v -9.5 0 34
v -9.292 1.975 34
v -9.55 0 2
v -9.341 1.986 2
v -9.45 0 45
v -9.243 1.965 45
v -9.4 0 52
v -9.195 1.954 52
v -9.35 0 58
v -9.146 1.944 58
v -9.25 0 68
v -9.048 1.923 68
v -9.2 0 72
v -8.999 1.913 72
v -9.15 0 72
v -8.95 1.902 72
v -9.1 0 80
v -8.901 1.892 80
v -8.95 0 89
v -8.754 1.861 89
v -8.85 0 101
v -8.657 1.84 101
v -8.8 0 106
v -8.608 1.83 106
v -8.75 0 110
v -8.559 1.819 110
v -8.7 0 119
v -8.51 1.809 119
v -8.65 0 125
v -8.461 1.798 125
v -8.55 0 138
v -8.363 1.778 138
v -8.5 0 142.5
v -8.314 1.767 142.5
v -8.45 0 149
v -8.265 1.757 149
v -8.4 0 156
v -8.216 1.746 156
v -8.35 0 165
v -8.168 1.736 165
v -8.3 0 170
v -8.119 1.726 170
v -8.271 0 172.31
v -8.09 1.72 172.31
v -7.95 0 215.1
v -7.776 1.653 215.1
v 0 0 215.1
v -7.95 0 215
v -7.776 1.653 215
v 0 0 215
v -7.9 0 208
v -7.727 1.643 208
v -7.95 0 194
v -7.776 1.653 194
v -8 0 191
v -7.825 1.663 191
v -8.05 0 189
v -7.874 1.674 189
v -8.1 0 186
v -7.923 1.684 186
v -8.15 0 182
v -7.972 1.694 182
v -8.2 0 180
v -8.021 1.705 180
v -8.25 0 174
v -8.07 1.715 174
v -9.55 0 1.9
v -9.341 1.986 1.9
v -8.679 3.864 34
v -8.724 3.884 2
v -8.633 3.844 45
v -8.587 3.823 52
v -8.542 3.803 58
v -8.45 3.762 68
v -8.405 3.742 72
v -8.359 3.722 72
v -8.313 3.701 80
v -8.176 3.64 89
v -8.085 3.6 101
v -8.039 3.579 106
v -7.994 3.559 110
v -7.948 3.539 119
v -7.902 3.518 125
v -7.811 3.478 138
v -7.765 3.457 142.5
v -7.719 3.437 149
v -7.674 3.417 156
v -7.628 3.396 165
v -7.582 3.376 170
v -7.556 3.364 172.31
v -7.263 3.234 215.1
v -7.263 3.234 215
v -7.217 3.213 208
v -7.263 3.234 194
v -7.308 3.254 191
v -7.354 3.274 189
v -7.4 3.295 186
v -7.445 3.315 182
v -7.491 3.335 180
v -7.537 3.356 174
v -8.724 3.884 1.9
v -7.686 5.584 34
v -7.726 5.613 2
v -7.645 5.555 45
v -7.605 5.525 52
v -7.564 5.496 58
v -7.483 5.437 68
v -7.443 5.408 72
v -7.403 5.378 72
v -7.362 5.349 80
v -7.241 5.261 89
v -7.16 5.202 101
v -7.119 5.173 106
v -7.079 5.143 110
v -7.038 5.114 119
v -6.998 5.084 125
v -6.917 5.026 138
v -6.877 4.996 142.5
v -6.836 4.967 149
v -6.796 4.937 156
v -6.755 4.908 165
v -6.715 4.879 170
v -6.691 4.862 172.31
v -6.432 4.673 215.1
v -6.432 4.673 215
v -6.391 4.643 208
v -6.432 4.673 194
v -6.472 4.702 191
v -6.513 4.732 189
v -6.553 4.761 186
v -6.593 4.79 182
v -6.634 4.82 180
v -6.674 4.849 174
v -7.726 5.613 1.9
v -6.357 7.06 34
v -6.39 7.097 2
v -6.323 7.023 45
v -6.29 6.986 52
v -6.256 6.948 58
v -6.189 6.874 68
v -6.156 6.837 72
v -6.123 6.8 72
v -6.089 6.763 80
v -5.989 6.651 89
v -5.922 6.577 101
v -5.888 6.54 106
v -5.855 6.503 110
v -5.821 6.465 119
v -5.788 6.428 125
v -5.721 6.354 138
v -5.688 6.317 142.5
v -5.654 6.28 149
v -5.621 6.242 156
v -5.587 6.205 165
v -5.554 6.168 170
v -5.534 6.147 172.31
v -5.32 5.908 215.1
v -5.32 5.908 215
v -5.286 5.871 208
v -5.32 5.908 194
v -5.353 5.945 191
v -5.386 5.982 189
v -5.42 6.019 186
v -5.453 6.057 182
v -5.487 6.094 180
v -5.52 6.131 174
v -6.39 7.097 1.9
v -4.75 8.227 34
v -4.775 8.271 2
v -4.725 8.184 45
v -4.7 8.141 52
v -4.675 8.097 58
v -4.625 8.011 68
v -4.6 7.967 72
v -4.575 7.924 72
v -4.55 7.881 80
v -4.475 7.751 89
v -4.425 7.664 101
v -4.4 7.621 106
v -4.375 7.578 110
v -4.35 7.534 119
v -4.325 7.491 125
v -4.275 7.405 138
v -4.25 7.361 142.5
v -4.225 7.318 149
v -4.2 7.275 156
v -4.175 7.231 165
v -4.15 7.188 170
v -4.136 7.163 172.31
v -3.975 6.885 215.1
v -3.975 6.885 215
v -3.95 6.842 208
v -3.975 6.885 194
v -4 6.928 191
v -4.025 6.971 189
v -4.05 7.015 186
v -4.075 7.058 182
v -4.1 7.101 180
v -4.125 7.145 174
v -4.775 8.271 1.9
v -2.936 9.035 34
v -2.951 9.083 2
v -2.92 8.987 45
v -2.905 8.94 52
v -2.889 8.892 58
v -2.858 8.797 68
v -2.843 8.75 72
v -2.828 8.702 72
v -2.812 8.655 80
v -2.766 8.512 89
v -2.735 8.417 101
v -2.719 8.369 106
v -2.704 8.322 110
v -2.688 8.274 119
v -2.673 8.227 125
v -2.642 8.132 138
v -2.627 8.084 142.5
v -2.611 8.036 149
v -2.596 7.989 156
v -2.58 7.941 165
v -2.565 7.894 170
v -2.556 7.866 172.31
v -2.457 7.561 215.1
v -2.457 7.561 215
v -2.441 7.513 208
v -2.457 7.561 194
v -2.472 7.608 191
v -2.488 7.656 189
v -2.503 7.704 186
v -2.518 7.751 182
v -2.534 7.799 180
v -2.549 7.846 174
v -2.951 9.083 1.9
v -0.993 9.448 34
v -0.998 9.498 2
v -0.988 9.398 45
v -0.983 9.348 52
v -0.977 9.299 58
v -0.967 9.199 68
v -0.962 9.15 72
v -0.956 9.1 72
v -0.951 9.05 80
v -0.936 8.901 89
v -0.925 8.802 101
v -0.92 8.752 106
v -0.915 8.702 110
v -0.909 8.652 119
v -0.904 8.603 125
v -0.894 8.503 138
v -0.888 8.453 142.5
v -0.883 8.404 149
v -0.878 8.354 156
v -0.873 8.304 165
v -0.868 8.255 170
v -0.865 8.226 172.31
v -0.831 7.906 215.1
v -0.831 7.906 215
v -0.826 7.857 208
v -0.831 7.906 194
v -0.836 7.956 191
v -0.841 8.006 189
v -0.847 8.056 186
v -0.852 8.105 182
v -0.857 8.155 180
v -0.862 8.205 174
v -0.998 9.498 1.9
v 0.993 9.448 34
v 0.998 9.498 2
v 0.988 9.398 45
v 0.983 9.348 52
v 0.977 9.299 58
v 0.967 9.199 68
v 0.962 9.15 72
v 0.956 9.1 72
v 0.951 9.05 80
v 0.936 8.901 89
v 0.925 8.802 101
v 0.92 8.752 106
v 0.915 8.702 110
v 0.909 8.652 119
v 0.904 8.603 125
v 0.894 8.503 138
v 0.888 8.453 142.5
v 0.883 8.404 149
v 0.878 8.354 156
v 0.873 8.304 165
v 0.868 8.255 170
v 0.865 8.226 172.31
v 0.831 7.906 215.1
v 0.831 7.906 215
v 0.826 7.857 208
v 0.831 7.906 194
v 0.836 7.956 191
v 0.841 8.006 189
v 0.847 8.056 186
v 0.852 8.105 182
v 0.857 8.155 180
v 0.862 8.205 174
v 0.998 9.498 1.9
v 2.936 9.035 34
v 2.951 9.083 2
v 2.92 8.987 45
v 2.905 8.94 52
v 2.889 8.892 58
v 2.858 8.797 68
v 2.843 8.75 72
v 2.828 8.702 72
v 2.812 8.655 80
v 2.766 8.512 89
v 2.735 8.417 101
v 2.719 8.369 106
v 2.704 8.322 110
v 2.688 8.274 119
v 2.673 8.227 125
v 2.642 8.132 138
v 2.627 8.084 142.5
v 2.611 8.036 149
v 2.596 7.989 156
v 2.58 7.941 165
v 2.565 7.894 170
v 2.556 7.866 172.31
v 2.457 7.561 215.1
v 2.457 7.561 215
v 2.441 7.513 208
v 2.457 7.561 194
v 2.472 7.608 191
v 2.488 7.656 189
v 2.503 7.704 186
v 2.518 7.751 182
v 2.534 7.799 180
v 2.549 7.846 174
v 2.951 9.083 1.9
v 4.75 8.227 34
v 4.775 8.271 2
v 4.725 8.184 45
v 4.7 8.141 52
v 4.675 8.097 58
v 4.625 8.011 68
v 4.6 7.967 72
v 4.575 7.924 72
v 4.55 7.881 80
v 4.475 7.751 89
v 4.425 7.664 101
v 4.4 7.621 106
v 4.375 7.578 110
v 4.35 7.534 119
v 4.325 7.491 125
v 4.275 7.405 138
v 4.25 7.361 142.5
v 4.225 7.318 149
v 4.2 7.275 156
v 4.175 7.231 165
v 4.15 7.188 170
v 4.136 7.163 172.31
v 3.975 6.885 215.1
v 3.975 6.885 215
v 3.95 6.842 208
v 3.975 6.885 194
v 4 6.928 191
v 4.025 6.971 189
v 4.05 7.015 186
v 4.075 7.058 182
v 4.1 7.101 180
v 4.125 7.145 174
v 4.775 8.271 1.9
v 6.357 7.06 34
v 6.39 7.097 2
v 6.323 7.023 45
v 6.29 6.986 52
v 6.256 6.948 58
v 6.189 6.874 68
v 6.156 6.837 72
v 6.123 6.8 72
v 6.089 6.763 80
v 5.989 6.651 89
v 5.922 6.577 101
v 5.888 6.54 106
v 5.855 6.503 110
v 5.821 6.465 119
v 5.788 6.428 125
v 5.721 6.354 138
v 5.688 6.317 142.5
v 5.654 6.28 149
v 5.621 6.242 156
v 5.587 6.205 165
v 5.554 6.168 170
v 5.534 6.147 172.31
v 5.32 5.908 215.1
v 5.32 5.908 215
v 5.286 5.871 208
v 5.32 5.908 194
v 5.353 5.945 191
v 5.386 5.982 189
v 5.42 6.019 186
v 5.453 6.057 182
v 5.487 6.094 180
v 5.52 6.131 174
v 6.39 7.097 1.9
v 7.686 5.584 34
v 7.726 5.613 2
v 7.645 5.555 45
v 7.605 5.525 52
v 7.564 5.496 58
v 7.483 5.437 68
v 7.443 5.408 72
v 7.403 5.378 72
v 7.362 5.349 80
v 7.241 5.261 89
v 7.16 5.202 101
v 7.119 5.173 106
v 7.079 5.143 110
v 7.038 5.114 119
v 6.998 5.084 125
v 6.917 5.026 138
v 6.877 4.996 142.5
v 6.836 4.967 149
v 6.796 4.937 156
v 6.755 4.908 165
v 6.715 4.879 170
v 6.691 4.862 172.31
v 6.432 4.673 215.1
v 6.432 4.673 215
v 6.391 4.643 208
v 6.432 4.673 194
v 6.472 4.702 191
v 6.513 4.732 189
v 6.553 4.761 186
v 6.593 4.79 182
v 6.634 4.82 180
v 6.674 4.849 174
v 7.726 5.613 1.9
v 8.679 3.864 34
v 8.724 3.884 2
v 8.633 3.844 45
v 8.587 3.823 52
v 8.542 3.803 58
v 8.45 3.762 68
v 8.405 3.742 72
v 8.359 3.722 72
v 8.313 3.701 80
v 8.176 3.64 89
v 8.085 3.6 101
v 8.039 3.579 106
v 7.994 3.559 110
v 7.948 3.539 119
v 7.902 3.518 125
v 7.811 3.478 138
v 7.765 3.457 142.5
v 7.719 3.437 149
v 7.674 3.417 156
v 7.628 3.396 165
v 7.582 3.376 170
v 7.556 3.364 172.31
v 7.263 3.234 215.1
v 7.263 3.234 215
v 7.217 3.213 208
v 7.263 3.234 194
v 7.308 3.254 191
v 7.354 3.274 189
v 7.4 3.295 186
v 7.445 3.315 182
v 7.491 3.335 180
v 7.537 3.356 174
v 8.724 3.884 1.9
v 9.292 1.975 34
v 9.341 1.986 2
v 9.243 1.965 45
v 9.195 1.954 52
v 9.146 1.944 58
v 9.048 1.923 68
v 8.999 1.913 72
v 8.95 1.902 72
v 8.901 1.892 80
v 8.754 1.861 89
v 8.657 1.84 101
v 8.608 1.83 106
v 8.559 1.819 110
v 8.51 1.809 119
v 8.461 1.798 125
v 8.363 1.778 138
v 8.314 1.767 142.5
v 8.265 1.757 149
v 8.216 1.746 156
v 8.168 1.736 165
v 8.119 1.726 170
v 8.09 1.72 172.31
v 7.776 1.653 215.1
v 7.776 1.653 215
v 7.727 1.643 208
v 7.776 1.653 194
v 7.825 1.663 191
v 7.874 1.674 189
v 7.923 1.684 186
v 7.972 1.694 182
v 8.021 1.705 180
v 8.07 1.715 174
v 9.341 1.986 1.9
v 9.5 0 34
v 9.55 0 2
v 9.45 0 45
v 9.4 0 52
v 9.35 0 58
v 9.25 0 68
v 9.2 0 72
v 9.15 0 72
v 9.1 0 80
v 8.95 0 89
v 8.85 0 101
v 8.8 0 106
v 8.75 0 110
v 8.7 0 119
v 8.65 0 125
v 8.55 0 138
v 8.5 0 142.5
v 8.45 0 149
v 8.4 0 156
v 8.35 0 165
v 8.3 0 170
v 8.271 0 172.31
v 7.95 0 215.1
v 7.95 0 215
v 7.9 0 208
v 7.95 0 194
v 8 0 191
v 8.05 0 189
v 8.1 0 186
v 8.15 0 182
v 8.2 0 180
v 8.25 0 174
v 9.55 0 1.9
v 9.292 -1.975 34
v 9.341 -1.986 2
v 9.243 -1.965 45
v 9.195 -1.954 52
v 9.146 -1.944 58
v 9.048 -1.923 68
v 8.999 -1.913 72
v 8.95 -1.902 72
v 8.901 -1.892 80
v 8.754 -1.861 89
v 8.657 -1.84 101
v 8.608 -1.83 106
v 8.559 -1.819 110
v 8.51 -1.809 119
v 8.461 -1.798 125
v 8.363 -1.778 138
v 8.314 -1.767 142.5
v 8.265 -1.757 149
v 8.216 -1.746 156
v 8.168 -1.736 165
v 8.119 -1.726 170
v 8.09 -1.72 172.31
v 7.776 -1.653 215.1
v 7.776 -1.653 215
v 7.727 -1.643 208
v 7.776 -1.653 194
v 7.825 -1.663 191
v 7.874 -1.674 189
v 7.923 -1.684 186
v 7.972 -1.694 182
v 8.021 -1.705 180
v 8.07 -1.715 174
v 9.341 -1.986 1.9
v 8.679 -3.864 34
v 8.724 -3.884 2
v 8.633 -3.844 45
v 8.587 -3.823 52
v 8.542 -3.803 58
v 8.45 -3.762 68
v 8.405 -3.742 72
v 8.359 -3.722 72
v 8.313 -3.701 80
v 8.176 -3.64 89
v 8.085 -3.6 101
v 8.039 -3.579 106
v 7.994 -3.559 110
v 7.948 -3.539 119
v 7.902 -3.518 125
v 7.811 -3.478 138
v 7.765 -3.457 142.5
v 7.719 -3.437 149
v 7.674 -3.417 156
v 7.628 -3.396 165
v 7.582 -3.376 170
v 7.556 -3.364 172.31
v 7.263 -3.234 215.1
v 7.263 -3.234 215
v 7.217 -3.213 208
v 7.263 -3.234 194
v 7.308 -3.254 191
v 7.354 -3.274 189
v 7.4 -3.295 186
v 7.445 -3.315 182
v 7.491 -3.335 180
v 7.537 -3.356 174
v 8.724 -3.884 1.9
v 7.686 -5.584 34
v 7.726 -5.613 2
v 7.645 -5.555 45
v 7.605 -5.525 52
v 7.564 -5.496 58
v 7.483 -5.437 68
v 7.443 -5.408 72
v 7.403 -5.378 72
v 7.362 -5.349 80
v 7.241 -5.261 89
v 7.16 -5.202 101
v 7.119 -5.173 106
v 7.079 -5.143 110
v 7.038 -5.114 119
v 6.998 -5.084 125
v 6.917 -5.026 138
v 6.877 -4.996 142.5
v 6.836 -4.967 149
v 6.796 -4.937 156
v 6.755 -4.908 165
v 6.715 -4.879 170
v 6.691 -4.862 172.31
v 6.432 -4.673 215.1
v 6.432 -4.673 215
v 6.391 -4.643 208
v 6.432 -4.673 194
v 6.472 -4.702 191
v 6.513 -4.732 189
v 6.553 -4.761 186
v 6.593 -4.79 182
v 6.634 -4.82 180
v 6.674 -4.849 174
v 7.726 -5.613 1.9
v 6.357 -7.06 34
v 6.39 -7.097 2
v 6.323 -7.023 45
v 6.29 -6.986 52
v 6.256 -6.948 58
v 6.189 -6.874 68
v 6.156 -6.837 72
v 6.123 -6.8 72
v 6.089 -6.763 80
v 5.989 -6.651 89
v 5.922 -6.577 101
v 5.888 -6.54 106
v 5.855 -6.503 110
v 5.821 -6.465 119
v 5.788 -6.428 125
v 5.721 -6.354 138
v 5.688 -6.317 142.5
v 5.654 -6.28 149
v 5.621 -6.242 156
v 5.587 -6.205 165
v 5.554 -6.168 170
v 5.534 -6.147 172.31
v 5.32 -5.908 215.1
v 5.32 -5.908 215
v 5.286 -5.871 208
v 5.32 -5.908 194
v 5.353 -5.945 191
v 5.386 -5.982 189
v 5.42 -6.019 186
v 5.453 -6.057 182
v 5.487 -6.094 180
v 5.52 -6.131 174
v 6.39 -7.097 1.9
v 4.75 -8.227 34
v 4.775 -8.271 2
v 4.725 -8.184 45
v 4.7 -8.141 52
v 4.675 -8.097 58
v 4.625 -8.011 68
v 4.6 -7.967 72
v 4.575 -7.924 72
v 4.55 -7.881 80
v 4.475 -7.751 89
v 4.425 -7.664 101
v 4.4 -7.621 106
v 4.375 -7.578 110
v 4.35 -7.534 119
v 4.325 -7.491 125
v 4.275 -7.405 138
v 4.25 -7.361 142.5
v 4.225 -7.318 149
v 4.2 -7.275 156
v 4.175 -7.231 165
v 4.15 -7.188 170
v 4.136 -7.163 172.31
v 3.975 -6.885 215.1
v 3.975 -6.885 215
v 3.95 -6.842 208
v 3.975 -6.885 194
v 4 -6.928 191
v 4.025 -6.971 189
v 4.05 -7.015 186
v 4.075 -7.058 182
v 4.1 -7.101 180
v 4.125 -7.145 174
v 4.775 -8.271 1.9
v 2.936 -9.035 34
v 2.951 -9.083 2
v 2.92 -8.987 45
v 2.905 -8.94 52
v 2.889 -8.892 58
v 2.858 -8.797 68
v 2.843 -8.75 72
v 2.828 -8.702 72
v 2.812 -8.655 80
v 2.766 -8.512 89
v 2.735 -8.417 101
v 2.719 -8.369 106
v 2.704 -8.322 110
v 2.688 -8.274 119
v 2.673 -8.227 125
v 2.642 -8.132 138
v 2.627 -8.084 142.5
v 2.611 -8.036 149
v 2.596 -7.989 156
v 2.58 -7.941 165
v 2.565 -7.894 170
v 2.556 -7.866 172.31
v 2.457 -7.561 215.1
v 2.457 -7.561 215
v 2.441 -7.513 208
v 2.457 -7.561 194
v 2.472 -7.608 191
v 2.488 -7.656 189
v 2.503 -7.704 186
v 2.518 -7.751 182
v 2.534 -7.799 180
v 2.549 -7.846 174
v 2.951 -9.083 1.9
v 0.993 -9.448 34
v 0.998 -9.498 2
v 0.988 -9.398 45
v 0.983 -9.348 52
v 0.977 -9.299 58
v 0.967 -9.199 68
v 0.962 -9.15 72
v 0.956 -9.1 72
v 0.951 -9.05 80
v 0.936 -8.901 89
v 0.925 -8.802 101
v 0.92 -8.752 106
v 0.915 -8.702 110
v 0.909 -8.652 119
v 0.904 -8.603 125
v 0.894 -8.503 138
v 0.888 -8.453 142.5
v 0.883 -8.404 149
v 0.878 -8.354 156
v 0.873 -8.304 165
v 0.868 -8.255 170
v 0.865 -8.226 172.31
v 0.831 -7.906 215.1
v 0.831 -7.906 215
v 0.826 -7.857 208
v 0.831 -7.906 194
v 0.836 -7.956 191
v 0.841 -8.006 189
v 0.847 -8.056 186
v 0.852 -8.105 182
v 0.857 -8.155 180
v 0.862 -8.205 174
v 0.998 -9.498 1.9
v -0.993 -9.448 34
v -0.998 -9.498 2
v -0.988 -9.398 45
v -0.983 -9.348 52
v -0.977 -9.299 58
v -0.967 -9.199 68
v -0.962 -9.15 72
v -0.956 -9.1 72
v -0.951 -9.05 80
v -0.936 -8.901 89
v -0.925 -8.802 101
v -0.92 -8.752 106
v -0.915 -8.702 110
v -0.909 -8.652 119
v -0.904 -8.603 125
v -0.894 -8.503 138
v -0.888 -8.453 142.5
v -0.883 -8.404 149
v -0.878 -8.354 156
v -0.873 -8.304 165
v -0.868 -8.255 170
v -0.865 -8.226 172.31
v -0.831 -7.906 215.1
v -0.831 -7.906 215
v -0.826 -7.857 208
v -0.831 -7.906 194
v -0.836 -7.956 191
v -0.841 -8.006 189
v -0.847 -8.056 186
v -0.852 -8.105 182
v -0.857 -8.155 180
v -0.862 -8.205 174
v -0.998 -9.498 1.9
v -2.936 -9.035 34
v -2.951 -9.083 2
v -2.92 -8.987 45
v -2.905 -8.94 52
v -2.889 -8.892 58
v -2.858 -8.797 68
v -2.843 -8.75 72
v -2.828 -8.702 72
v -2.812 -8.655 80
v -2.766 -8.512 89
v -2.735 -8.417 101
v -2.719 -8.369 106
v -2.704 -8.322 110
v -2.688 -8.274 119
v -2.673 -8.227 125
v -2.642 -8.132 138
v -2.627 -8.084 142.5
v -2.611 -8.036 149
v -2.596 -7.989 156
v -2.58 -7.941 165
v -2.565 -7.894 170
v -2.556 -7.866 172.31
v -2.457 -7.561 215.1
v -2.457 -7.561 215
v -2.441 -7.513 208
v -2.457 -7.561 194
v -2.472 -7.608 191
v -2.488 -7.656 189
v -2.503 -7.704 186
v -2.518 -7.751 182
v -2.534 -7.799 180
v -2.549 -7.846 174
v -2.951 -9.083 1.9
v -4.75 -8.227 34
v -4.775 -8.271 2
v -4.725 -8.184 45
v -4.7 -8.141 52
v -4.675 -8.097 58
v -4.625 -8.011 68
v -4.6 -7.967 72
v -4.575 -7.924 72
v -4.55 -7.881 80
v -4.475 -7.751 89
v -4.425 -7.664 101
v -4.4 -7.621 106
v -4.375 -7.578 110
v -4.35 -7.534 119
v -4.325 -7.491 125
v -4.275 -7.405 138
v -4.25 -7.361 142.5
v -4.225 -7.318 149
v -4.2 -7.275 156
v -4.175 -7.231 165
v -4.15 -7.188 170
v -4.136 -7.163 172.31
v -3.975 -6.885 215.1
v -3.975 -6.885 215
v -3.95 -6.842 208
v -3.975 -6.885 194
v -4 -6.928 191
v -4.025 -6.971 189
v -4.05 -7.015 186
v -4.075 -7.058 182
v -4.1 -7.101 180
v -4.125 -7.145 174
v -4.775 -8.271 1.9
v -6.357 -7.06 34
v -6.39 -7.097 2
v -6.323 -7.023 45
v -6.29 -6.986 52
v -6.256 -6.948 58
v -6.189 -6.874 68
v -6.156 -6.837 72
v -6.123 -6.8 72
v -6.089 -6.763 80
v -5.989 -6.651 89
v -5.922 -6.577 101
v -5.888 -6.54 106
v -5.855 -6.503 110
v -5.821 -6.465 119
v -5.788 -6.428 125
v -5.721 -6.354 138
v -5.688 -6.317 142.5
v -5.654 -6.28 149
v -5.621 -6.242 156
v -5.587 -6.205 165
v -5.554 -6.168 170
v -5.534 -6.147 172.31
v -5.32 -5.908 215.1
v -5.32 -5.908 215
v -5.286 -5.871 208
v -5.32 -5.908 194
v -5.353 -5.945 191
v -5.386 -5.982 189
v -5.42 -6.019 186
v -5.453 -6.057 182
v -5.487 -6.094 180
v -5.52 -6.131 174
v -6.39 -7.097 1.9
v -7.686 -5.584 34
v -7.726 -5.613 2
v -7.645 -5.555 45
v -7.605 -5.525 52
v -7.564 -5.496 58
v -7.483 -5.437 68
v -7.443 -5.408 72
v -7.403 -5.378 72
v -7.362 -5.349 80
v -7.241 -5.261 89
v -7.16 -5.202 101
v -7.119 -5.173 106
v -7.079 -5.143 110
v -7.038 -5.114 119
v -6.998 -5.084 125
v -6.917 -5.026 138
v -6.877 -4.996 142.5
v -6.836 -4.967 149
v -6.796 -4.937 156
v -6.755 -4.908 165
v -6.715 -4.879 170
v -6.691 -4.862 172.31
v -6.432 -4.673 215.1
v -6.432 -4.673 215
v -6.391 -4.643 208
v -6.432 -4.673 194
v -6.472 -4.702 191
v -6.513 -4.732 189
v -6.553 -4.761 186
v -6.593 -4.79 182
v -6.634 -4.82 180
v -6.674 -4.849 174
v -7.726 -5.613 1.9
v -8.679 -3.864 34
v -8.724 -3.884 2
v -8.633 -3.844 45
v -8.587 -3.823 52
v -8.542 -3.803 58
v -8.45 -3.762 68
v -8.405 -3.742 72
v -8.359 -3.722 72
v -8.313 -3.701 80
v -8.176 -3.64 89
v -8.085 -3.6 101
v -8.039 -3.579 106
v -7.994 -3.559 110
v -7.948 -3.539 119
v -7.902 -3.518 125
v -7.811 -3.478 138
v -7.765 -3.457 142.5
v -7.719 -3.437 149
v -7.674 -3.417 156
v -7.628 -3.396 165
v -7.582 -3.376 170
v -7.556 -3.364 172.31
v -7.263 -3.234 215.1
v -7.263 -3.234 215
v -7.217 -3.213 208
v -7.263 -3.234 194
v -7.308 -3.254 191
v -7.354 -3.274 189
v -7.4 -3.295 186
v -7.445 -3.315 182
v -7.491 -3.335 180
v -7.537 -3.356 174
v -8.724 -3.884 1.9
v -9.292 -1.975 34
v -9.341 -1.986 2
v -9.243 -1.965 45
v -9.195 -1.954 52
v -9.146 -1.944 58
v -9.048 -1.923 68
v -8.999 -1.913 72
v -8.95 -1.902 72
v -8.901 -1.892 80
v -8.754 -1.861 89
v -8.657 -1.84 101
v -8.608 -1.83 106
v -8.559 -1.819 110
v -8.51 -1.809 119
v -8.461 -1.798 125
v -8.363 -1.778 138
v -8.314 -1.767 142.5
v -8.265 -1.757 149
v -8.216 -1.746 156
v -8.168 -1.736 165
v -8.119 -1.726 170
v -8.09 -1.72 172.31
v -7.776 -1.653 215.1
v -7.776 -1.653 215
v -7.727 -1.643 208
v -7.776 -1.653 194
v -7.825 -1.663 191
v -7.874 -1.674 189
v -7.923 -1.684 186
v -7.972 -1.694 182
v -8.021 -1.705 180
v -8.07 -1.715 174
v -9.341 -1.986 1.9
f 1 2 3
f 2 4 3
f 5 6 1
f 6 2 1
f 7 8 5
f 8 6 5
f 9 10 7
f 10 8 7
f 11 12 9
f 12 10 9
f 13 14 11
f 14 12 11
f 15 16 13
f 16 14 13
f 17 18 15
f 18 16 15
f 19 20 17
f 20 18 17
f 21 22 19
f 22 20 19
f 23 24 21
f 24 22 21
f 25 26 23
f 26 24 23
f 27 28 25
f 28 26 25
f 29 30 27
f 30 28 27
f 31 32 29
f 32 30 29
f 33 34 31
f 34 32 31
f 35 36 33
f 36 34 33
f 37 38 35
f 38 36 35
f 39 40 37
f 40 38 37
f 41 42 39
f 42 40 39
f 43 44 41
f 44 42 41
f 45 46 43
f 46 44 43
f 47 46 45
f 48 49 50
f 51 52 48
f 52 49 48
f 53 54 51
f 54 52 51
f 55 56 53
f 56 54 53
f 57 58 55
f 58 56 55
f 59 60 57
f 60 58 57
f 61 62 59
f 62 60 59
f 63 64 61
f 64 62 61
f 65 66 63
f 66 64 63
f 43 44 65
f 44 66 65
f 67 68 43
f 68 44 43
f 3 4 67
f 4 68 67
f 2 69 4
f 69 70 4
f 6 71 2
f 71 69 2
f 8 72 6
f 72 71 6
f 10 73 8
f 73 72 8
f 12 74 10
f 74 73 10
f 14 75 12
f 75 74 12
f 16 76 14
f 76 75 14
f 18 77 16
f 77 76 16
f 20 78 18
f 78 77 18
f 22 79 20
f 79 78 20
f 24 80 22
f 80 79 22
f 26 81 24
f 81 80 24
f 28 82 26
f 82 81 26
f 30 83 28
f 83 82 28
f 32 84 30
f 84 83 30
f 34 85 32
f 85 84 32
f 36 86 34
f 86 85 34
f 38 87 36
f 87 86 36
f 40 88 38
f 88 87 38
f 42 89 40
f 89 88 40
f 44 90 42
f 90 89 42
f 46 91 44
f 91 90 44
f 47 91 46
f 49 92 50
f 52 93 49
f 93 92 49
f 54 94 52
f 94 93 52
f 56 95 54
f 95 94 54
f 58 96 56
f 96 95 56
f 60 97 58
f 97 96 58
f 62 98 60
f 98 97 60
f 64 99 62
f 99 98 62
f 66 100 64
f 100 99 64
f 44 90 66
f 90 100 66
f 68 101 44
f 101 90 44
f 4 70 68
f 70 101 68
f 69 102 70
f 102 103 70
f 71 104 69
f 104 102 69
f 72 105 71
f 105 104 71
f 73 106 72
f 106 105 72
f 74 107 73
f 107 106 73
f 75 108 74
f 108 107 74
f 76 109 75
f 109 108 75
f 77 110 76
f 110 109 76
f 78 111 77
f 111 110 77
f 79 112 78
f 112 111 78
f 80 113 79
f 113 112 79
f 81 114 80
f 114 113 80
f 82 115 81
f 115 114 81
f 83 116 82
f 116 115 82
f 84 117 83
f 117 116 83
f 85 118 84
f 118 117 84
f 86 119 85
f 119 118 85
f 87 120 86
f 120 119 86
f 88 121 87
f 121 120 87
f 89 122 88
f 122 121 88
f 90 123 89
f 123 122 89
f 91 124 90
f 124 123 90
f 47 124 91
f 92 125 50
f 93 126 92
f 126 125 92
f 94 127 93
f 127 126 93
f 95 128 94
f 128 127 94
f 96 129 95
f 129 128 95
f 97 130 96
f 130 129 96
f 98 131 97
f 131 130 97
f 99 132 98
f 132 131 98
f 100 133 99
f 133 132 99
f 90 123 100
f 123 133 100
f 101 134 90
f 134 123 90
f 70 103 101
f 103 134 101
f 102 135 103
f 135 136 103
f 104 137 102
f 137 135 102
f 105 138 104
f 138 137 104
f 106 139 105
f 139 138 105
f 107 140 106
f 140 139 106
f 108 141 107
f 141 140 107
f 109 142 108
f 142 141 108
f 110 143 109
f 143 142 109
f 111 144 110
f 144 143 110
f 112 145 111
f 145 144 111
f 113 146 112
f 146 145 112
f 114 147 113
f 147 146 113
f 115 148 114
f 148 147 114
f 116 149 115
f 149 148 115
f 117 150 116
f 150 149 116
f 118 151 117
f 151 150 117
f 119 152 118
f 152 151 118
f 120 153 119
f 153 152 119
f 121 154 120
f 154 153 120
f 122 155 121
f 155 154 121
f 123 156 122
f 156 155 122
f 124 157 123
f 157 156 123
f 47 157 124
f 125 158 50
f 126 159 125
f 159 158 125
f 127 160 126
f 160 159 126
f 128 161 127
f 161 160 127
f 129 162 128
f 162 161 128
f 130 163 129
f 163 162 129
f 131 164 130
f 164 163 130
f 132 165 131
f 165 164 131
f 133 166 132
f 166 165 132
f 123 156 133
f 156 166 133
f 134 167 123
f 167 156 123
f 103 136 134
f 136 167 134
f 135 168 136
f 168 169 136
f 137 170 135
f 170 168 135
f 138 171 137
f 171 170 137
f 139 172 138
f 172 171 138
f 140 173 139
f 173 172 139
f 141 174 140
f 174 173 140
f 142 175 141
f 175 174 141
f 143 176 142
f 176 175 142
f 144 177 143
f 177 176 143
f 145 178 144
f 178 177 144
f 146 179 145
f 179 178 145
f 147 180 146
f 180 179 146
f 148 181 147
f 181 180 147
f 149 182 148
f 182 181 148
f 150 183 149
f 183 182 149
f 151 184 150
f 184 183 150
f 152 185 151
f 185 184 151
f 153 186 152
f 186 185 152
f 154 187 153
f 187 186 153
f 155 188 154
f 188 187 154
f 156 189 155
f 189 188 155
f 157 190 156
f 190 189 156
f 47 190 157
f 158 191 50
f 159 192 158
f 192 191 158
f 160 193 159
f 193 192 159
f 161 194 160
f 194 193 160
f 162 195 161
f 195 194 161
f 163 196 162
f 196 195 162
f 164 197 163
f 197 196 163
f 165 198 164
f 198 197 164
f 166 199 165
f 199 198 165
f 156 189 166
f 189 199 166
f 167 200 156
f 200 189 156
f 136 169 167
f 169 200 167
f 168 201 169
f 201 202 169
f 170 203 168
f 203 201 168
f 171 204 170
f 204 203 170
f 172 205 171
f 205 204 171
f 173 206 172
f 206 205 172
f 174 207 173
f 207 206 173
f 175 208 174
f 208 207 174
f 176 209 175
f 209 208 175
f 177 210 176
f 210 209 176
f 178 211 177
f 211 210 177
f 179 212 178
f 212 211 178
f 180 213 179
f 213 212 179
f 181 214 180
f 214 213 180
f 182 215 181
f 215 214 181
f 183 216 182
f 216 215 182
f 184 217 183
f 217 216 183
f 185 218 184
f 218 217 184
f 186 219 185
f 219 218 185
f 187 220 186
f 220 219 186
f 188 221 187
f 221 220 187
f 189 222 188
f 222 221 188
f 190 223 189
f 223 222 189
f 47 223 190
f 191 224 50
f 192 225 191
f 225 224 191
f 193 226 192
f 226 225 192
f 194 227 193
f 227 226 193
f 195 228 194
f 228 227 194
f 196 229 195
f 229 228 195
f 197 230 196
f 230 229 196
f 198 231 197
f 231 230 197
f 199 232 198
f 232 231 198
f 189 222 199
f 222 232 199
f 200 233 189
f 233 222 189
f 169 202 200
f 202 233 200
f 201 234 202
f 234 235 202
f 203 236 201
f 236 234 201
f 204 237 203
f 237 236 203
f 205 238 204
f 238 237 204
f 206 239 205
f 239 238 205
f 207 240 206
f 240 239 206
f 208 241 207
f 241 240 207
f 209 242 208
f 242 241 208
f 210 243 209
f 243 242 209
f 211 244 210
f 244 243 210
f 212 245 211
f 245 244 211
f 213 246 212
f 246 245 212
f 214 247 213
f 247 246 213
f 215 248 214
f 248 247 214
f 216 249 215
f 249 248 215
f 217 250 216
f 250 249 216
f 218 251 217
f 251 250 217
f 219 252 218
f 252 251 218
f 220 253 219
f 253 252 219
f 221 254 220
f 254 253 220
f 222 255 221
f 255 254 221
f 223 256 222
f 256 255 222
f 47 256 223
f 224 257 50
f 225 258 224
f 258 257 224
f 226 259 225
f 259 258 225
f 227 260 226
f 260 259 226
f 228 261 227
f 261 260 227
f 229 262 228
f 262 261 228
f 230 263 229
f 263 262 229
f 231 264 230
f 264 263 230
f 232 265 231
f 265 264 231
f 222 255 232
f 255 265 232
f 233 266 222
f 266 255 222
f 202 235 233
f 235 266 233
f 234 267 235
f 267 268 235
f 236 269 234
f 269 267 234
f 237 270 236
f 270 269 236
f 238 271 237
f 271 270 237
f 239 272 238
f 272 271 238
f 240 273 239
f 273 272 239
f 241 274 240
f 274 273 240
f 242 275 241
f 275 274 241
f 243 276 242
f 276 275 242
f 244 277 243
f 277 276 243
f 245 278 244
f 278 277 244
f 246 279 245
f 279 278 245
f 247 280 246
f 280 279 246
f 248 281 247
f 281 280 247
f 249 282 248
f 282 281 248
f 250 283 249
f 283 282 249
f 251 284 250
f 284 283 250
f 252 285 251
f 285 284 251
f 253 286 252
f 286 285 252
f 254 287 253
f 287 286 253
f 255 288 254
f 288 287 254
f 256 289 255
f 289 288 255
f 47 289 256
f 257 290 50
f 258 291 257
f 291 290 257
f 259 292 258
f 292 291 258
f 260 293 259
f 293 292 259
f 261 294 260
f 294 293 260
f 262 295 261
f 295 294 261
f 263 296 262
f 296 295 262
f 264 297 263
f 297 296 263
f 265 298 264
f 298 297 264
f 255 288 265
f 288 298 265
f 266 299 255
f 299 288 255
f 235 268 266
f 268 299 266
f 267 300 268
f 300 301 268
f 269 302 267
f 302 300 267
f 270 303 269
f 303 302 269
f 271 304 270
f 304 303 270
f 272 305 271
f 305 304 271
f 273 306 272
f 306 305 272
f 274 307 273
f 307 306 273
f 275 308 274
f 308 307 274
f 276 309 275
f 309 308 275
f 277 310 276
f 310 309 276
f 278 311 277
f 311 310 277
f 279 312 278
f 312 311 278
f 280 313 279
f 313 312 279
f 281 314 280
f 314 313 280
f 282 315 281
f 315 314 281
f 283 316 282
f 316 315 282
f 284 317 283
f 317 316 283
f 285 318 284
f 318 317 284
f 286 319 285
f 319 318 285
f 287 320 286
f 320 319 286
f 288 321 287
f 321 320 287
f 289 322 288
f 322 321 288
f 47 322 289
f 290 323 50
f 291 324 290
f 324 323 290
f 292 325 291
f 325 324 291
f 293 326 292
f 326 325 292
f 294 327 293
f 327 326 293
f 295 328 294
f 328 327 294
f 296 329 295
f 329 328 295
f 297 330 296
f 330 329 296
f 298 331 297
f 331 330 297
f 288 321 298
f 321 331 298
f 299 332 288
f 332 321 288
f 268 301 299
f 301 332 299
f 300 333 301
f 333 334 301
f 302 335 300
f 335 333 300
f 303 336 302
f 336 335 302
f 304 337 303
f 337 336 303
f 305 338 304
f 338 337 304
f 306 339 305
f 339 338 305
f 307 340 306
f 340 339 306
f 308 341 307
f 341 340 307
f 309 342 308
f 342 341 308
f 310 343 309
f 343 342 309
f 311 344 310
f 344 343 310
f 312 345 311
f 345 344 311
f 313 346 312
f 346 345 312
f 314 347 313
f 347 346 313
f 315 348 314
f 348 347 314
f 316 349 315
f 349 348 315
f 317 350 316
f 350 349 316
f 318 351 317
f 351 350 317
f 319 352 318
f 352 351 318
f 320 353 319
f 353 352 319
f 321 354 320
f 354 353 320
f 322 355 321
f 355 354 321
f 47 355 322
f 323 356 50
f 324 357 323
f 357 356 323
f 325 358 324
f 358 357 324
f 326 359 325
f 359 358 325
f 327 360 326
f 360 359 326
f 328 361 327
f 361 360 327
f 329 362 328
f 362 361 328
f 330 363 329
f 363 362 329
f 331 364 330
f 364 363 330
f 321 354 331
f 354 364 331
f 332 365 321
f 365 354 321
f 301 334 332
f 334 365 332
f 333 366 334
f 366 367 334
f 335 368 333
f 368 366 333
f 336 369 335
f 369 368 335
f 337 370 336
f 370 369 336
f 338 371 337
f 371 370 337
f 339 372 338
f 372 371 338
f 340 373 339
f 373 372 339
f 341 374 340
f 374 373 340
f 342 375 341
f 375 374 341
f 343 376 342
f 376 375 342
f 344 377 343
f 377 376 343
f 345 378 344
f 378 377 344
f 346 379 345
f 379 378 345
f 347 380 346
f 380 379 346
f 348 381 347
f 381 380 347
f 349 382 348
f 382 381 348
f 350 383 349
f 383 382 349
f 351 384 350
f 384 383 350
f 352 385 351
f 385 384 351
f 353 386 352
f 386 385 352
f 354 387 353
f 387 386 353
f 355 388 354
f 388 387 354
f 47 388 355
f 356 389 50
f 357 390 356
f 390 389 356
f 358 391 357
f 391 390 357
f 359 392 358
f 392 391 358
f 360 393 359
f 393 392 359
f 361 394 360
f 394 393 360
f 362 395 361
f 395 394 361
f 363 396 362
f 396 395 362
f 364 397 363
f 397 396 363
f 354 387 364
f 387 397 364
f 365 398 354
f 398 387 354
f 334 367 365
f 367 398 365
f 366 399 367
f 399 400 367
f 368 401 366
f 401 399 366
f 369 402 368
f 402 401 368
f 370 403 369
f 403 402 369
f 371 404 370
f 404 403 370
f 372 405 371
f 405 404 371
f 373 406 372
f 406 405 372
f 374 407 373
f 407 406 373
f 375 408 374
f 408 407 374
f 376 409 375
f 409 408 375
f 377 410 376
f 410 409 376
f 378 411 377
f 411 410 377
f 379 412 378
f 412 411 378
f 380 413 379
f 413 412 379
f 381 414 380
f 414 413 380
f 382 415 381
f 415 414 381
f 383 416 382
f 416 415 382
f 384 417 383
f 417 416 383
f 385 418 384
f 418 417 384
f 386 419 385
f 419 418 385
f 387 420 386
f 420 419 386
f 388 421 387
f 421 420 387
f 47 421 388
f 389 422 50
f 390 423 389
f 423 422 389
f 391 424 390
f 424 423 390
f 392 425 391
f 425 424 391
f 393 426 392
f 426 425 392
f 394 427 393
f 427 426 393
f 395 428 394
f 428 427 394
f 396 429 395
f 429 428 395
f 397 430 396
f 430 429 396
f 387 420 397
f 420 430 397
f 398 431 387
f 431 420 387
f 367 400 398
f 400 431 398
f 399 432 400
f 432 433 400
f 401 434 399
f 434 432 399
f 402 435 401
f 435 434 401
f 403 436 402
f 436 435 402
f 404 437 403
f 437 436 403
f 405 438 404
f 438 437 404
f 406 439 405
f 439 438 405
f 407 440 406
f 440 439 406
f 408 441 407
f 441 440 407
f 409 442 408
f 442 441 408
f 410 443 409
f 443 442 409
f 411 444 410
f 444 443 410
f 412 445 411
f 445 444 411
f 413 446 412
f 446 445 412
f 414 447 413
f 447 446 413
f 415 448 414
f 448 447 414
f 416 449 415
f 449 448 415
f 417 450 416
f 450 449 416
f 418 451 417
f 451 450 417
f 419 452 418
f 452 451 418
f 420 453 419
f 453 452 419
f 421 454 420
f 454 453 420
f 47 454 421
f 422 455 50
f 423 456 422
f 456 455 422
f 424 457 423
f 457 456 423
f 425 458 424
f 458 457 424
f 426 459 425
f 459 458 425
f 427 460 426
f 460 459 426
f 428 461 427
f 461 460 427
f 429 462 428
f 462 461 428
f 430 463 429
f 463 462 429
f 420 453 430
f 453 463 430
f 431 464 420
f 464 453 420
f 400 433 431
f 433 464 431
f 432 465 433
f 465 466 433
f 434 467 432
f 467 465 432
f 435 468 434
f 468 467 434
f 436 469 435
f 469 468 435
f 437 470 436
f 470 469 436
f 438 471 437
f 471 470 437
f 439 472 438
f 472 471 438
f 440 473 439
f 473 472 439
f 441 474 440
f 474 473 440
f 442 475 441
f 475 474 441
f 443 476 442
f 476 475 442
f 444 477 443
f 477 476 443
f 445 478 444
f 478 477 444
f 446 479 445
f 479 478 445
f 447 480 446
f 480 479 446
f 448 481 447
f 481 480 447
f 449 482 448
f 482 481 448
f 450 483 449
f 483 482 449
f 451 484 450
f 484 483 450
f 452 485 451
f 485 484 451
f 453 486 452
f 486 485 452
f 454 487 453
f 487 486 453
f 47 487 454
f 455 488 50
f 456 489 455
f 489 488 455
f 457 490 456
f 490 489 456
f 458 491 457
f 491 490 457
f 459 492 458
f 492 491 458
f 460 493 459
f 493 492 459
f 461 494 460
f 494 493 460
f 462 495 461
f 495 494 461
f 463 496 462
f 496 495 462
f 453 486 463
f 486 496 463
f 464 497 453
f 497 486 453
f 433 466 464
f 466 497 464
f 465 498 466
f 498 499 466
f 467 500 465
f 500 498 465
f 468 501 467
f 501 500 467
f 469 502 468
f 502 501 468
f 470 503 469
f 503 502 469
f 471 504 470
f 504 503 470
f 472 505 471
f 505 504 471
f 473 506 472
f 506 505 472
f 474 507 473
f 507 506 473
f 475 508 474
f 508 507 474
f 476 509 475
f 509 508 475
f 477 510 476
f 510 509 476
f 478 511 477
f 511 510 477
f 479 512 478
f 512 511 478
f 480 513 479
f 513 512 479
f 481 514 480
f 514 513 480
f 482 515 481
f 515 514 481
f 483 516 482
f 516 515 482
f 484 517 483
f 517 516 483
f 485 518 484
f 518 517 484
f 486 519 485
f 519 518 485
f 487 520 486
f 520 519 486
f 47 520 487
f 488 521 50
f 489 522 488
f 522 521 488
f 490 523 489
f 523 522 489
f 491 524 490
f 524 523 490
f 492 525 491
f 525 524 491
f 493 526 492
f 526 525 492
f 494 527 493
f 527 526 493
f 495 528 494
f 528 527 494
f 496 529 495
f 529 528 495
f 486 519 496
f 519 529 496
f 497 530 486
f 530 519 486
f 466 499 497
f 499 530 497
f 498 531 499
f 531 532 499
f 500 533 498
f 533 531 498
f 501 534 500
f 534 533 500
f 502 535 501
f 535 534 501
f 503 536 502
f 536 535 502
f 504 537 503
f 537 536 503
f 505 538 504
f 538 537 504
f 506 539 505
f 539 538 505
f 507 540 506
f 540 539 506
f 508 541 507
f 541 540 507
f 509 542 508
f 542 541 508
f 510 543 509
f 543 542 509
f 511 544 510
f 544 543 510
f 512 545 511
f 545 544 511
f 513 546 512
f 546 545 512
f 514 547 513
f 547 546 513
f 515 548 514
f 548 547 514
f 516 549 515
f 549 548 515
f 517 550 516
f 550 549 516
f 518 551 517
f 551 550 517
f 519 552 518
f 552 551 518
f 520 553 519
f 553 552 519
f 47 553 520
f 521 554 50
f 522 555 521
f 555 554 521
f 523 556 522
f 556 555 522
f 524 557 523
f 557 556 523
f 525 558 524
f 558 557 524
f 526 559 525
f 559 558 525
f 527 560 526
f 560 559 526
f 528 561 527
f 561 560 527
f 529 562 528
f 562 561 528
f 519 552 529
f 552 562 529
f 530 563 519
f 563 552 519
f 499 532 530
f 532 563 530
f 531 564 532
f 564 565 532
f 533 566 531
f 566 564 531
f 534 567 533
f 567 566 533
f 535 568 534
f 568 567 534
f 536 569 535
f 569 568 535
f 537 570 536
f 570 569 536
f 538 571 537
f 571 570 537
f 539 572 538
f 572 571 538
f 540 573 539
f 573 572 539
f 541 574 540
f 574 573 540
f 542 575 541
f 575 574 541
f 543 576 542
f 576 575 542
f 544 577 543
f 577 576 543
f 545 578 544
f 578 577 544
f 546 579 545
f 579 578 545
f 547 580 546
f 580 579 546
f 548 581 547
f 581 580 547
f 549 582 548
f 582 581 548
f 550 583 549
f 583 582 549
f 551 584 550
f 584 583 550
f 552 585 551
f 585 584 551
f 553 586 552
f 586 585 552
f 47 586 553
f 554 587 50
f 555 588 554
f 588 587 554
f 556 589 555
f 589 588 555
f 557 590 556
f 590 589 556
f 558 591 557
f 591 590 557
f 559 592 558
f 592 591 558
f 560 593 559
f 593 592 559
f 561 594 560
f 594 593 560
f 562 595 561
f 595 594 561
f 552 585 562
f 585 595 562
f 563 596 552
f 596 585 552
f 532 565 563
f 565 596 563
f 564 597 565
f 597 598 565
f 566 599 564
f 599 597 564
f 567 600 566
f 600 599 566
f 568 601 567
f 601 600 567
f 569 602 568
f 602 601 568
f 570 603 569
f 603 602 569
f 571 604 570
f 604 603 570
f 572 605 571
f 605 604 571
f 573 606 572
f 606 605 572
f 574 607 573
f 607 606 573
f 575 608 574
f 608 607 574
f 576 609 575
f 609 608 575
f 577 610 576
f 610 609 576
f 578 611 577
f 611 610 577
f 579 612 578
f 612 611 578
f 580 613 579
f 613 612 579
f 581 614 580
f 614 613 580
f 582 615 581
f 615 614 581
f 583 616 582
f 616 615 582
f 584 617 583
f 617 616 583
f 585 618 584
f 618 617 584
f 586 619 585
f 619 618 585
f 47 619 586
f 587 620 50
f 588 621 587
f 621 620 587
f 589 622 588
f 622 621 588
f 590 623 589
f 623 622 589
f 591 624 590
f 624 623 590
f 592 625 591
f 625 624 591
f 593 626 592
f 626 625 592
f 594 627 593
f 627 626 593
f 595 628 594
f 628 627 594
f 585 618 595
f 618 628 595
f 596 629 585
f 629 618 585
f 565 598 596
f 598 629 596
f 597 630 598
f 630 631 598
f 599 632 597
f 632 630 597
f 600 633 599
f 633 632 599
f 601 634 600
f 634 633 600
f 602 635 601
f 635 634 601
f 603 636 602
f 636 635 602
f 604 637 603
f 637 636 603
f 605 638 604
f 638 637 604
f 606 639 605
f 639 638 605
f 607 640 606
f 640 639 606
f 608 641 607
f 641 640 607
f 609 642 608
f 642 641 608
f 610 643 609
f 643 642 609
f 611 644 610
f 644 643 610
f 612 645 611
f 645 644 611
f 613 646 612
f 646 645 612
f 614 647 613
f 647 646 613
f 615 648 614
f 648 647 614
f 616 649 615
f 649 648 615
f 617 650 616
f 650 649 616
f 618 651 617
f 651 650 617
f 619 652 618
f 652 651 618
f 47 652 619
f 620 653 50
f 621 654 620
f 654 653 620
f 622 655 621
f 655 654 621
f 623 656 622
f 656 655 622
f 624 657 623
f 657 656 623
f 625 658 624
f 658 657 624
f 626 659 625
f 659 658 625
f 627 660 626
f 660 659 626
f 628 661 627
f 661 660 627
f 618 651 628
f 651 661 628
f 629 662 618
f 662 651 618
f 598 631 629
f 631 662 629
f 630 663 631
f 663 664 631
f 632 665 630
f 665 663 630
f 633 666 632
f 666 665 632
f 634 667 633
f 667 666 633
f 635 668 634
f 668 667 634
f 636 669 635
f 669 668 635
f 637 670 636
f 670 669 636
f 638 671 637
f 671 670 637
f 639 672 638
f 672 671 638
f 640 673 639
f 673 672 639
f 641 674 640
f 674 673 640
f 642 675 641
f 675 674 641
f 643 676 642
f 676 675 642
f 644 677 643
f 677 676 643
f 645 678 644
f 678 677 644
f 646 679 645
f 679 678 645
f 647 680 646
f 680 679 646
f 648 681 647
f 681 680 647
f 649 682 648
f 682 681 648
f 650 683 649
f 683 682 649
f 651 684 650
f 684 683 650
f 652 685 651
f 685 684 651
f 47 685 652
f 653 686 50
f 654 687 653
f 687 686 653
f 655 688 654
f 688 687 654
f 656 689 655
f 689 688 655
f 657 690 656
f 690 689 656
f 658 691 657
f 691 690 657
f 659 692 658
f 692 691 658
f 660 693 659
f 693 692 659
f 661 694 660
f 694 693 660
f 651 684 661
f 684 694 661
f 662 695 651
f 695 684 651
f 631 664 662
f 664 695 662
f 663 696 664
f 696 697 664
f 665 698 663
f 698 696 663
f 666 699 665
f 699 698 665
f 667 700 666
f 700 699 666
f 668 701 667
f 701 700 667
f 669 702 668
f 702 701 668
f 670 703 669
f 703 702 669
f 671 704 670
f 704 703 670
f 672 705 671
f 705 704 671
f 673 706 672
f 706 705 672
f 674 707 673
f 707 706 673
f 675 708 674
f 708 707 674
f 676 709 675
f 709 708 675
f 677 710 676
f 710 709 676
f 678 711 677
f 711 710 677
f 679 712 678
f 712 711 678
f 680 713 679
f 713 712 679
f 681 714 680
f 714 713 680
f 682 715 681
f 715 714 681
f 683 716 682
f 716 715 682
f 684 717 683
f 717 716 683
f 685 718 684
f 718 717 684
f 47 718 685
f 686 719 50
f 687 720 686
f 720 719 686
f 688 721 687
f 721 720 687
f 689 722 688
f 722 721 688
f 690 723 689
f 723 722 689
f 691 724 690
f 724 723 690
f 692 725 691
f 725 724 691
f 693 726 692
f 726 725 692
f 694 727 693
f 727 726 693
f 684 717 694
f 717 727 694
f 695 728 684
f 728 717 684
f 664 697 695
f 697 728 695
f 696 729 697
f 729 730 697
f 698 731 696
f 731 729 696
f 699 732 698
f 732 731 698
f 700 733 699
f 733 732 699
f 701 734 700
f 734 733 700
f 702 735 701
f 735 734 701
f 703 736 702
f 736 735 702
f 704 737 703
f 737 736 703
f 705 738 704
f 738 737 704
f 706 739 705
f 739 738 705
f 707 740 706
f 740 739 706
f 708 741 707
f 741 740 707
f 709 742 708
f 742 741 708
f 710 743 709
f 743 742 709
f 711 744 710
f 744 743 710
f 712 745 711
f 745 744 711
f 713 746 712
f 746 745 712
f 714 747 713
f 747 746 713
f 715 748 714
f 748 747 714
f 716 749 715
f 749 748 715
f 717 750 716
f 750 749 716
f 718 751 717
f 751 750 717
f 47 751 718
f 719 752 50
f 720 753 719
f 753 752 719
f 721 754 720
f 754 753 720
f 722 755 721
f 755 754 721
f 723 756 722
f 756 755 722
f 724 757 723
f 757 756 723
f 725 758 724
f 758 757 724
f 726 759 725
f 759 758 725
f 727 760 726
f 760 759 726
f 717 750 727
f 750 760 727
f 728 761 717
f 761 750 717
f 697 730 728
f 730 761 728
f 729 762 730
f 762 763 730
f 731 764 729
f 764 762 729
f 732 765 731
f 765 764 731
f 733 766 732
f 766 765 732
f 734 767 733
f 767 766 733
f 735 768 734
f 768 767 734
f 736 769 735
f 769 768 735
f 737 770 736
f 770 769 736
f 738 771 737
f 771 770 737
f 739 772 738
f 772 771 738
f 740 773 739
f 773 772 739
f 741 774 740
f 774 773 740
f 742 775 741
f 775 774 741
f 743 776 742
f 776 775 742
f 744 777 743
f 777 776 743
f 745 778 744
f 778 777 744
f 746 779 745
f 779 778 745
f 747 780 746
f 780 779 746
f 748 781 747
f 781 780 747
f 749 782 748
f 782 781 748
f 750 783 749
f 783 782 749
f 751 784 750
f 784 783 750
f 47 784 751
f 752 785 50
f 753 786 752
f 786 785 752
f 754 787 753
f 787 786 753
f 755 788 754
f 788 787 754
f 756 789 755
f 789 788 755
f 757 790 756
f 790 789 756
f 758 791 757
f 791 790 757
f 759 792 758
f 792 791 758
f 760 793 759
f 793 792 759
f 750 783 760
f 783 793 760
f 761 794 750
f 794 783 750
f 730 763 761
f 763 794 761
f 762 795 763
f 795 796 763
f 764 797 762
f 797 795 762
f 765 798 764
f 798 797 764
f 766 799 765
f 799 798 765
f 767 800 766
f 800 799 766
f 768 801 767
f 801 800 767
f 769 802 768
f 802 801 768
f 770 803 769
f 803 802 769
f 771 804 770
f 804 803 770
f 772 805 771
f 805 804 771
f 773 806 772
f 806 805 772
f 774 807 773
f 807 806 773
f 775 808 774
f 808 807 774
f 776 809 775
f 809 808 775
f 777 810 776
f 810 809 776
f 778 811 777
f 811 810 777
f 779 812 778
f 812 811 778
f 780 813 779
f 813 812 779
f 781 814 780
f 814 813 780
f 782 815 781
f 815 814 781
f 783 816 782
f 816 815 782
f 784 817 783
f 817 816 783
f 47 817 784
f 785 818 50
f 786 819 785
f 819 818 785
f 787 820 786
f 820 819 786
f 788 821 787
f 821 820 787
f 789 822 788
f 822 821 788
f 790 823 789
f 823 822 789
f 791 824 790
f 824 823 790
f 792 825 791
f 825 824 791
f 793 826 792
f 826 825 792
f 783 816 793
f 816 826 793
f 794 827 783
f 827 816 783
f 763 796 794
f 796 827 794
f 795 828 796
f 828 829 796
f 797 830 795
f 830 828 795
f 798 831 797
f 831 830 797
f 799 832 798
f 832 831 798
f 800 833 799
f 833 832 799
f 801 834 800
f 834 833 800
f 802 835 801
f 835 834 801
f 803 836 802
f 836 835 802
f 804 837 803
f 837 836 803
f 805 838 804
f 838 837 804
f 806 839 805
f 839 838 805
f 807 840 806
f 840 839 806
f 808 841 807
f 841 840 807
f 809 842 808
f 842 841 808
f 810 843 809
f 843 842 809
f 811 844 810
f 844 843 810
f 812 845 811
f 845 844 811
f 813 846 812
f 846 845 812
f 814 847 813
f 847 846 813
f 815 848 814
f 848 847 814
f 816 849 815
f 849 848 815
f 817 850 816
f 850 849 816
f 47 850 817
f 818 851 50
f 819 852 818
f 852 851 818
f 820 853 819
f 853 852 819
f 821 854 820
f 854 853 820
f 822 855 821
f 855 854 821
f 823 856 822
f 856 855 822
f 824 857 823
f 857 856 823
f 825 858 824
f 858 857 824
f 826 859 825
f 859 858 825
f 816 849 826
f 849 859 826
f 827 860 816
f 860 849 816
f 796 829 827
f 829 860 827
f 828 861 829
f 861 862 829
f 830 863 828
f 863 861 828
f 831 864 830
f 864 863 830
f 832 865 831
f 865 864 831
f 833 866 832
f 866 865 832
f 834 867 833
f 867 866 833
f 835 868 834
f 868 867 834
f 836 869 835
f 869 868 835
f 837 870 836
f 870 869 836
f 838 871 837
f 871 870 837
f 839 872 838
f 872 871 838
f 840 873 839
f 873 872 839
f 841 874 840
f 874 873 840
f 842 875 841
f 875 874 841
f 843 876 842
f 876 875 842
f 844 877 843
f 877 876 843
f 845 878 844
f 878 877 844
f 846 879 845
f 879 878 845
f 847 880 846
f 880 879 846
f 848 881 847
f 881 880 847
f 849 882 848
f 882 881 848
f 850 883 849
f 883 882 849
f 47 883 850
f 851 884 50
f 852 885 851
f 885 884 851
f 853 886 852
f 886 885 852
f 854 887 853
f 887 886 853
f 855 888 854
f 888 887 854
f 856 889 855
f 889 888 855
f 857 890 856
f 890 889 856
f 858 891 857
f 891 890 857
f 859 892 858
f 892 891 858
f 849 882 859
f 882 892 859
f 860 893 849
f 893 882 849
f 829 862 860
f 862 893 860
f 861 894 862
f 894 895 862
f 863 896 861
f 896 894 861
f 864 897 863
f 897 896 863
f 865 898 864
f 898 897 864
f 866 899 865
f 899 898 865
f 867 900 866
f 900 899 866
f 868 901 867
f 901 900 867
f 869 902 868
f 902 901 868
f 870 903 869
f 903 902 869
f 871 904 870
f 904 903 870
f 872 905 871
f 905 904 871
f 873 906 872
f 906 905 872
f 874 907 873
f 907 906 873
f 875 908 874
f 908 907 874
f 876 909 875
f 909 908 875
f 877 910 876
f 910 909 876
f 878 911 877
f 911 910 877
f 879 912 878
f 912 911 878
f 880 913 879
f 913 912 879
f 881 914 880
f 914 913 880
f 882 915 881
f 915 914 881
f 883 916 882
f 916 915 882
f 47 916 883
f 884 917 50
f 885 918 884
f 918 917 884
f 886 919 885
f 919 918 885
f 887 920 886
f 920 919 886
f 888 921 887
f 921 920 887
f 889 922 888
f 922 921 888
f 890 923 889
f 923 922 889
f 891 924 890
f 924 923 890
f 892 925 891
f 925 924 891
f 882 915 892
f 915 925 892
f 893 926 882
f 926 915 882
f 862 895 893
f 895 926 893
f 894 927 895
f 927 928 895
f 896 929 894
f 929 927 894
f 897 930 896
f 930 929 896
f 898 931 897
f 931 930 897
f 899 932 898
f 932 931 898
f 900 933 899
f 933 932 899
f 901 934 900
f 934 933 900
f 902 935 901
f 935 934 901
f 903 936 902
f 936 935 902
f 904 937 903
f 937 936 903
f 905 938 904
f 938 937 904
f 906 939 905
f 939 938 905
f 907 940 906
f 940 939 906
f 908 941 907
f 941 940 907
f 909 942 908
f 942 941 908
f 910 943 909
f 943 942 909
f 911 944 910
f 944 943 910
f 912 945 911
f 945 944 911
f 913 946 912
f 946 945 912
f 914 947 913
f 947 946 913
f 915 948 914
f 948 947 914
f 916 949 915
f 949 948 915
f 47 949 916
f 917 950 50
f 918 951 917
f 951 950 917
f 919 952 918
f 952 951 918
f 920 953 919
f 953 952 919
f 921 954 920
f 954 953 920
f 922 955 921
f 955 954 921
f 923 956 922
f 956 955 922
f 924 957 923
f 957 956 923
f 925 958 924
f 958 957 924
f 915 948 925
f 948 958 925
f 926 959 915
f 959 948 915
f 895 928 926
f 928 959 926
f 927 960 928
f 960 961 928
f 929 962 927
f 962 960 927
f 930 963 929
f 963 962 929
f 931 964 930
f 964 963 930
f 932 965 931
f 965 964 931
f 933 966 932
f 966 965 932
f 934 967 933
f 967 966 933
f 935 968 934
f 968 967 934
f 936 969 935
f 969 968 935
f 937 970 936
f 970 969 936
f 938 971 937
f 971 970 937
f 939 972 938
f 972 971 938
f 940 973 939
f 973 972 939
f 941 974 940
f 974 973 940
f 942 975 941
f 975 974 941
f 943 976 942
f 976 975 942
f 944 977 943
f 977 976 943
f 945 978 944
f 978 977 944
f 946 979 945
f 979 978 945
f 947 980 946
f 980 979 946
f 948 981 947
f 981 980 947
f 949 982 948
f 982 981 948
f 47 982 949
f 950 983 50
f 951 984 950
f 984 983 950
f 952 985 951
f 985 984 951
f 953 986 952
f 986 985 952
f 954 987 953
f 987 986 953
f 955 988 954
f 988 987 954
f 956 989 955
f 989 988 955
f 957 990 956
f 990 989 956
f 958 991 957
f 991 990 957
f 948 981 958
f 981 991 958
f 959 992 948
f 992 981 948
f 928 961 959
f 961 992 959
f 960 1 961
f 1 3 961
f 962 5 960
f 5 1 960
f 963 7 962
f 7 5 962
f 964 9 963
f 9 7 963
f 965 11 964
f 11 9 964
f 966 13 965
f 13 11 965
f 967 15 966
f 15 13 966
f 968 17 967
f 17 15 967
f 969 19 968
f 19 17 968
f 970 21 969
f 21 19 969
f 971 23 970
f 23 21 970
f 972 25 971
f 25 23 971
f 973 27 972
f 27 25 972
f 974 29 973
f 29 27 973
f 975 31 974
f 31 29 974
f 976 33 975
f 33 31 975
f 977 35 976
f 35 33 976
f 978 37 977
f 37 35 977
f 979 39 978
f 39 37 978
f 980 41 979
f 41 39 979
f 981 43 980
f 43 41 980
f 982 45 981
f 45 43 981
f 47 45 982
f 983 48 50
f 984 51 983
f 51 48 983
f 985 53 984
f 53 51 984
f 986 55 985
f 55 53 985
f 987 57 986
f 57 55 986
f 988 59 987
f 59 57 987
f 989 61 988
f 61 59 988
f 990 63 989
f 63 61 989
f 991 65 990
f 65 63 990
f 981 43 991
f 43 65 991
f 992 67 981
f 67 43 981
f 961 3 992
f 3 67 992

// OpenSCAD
rotate_extrude () {
  polygon (points=[[7.95, 215.1], [9.55, 1.9], [9.55, 2.0], [9.5, 34.0], [9.45, 45.0], [9.4, 52.0], [9.35, 58.0], [9.3, 63.0], [9.25, 68.0], [9.2, 72.0], [9.15, 72.0], [9.1, 80.0], [9.05, 83.0], [9.0, 86.0], [8.95, 89.0], [8.85, 101.0], [8.8, 106.0], [8.75, 110.0], [8.7, 119.0], [8.65, 125.0], [8.55, 138.0], [8.5, 142.5], [8.45, 149.0], [8.4, 156.0], [8.35, 165.0], [8.3, 170.0], [8.25, 174.0], [8.2, 180.0], [8.15, 182.0], [8.1, 186.0], [8.05, 189.0], [8.0, 191.0], [7.95, 194.0], [7.9, 208.0], [7.95, 215.0], [0, 215.0], [0, 208.0], [0, 194.0], [0, 191.0], [0, 189.0], [0, 186.0], [0, 182.0], [0, 180.0], [0, 174.0], [0, 170.0], [0, 165.0], [0, 156.0], [0, 149.0], [0, 142.5], [0, 138.0], [0, 125.0], [0, 119.0], [0, 110.0], [0, 106.0], [0, 101.0], [0, 89.0], [0, 86.0], [0, 83.0], [0, 80.0], [0, 72.0], [0, 72.0], [0, 68.0], [0, 63.0], [0, 58.0], [0, 52.0], [0, 45.0], [0, 34.0], [0, 2.0], [0, 1.9], [0, 215.1]]);
}
